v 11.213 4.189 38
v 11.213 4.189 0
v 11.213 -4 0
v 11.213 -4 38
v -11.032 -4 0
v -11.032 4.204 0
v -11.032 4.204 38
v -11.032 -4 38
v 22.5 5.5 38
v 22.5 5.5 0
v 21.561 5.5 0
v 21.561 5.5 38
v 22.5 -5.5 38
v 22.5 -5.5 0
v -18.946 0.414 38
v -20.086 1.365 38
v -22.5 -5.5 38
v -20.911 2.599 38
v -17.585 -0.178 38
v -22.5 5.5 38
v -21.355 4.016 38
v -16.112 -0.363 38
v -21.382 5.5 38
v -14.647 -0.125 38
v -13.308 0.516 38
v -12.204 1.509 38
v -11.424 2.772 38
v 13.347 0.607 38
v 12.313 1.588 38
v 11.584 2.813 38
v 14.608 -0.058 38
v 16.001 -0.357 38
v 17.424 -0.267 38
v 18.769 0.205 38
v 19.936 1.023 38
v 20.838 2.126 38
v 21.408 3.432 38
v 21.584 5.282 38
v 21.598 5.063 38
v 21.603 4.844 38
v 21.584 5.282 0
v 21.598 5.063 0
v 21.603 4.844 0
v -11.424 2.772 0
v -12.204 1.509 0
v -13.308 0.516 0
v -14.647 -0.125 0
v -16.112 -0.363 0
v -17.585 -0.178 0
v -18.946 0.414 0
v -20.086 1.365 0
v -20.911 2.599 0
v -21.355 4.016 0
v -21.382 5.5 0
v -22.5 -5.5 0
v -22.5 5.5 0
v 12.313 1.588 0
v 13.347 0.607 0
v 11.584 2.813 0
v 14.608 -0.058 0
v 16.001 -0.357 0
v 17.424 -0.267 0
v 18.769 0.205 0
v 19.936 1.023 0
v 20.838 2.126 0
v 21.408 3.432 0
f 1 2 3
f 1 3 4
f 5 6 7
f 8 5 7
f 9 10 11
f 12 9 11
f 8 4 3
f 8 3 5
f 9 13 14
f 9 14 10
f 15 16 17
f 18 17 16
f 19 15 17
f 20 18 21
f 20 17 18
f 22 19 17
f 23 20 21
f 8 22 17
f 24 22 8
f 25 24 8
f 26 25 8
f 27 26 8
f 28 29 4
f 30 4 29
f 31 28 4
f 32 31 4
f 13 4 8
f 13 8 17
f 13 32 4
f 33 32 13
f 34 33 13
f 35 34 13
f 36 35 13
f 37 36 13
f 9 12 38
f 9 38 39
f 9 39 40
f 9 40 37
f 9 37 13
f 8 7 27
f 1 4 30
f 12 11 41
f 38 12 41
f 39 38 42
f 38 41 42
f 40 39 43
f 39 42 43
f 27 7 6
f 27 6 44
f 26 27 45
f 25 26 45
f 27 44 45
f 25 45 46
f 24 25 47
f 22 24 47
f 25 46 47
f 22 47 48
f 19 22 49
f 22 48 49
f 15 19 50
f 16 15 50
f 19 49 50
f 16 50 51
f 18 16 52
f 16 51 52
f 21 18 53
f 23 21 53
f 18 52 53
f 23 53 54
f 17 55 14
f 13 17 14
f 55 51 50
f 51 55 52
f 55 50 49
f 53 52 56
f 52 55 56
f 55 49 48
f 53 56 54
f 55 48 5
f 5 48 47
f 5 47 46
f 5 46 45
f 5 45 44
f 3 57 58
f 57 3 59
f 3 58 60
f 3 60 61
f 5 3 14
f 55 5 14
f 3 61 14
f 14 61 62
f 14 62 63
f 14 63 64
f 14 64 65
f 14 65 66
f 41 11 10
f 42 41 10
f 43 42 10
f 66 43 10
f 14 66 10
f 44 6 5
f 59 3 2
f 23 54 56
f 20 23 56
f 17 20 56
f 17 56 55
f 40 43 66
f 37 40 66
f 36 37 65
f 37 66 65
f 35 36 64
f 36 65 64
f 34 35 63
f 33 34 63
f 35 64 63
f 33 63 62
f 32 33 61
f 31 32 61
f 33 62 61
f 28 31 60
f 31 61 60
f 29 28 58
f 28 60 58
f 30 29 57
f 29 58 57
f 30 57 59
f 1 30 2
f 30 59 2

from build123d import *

# Parameters (mm, degrees)
F2_DEPTH  = 38
F2_FACE_W = 22.245048
F2_FACE_H = 38
F3_DEPTH  = 9.5


with BuildPart() as f2:
    # F1 (on face) → F2 (new body)
    with BuildSketch(Plane.XY):
        with BuildLine():
            ThreePointArc((-11.031821, 5.5), (-11.001501, 5.176519), (-10.991381, 4.851777))
            ThreePointArc((-10.991381, 4.851777), (-16.531552, -0.353532), (-21.381799, 5.5))
            Line((-21.381799, 5.5), (-22.5, 5.5))
            Line((-22.5, 5.5), (-22.5, -5.5))
            Line((-22.5, -5.5), (22.5, -5.5))
            Line((22.5, -5.5), (22.5, 5.5))
            Line((22.5, 5.5), (21.561348, 5.5))
            ThreePointArc((21.561348, 5.5), (21.592364, 5.172855), (21.602717, 4.844405))
            ThreePointArc((21.602717, 4.844405), (16.058838, -0.360671), (11.213227, 5.5))
            Line((11.213227, 5.5), (-11.031821, 5.5))
        make_face()
    extrude(amount=F2_DEPTH)

    # F2_face (on face) → F3 (cut)
    with BuildSketch(Plane(origin=(0.090703, 5.5, 19), x_dir=(-1, 0, 0), z_dir=(0, 1, 0))):
        Rectangle(F2_FACE_W, F2_FACE_H)
    extrude(amount=-F3_DEPTH, mode=Mode.SUBTRACT)


solid = f2.part
